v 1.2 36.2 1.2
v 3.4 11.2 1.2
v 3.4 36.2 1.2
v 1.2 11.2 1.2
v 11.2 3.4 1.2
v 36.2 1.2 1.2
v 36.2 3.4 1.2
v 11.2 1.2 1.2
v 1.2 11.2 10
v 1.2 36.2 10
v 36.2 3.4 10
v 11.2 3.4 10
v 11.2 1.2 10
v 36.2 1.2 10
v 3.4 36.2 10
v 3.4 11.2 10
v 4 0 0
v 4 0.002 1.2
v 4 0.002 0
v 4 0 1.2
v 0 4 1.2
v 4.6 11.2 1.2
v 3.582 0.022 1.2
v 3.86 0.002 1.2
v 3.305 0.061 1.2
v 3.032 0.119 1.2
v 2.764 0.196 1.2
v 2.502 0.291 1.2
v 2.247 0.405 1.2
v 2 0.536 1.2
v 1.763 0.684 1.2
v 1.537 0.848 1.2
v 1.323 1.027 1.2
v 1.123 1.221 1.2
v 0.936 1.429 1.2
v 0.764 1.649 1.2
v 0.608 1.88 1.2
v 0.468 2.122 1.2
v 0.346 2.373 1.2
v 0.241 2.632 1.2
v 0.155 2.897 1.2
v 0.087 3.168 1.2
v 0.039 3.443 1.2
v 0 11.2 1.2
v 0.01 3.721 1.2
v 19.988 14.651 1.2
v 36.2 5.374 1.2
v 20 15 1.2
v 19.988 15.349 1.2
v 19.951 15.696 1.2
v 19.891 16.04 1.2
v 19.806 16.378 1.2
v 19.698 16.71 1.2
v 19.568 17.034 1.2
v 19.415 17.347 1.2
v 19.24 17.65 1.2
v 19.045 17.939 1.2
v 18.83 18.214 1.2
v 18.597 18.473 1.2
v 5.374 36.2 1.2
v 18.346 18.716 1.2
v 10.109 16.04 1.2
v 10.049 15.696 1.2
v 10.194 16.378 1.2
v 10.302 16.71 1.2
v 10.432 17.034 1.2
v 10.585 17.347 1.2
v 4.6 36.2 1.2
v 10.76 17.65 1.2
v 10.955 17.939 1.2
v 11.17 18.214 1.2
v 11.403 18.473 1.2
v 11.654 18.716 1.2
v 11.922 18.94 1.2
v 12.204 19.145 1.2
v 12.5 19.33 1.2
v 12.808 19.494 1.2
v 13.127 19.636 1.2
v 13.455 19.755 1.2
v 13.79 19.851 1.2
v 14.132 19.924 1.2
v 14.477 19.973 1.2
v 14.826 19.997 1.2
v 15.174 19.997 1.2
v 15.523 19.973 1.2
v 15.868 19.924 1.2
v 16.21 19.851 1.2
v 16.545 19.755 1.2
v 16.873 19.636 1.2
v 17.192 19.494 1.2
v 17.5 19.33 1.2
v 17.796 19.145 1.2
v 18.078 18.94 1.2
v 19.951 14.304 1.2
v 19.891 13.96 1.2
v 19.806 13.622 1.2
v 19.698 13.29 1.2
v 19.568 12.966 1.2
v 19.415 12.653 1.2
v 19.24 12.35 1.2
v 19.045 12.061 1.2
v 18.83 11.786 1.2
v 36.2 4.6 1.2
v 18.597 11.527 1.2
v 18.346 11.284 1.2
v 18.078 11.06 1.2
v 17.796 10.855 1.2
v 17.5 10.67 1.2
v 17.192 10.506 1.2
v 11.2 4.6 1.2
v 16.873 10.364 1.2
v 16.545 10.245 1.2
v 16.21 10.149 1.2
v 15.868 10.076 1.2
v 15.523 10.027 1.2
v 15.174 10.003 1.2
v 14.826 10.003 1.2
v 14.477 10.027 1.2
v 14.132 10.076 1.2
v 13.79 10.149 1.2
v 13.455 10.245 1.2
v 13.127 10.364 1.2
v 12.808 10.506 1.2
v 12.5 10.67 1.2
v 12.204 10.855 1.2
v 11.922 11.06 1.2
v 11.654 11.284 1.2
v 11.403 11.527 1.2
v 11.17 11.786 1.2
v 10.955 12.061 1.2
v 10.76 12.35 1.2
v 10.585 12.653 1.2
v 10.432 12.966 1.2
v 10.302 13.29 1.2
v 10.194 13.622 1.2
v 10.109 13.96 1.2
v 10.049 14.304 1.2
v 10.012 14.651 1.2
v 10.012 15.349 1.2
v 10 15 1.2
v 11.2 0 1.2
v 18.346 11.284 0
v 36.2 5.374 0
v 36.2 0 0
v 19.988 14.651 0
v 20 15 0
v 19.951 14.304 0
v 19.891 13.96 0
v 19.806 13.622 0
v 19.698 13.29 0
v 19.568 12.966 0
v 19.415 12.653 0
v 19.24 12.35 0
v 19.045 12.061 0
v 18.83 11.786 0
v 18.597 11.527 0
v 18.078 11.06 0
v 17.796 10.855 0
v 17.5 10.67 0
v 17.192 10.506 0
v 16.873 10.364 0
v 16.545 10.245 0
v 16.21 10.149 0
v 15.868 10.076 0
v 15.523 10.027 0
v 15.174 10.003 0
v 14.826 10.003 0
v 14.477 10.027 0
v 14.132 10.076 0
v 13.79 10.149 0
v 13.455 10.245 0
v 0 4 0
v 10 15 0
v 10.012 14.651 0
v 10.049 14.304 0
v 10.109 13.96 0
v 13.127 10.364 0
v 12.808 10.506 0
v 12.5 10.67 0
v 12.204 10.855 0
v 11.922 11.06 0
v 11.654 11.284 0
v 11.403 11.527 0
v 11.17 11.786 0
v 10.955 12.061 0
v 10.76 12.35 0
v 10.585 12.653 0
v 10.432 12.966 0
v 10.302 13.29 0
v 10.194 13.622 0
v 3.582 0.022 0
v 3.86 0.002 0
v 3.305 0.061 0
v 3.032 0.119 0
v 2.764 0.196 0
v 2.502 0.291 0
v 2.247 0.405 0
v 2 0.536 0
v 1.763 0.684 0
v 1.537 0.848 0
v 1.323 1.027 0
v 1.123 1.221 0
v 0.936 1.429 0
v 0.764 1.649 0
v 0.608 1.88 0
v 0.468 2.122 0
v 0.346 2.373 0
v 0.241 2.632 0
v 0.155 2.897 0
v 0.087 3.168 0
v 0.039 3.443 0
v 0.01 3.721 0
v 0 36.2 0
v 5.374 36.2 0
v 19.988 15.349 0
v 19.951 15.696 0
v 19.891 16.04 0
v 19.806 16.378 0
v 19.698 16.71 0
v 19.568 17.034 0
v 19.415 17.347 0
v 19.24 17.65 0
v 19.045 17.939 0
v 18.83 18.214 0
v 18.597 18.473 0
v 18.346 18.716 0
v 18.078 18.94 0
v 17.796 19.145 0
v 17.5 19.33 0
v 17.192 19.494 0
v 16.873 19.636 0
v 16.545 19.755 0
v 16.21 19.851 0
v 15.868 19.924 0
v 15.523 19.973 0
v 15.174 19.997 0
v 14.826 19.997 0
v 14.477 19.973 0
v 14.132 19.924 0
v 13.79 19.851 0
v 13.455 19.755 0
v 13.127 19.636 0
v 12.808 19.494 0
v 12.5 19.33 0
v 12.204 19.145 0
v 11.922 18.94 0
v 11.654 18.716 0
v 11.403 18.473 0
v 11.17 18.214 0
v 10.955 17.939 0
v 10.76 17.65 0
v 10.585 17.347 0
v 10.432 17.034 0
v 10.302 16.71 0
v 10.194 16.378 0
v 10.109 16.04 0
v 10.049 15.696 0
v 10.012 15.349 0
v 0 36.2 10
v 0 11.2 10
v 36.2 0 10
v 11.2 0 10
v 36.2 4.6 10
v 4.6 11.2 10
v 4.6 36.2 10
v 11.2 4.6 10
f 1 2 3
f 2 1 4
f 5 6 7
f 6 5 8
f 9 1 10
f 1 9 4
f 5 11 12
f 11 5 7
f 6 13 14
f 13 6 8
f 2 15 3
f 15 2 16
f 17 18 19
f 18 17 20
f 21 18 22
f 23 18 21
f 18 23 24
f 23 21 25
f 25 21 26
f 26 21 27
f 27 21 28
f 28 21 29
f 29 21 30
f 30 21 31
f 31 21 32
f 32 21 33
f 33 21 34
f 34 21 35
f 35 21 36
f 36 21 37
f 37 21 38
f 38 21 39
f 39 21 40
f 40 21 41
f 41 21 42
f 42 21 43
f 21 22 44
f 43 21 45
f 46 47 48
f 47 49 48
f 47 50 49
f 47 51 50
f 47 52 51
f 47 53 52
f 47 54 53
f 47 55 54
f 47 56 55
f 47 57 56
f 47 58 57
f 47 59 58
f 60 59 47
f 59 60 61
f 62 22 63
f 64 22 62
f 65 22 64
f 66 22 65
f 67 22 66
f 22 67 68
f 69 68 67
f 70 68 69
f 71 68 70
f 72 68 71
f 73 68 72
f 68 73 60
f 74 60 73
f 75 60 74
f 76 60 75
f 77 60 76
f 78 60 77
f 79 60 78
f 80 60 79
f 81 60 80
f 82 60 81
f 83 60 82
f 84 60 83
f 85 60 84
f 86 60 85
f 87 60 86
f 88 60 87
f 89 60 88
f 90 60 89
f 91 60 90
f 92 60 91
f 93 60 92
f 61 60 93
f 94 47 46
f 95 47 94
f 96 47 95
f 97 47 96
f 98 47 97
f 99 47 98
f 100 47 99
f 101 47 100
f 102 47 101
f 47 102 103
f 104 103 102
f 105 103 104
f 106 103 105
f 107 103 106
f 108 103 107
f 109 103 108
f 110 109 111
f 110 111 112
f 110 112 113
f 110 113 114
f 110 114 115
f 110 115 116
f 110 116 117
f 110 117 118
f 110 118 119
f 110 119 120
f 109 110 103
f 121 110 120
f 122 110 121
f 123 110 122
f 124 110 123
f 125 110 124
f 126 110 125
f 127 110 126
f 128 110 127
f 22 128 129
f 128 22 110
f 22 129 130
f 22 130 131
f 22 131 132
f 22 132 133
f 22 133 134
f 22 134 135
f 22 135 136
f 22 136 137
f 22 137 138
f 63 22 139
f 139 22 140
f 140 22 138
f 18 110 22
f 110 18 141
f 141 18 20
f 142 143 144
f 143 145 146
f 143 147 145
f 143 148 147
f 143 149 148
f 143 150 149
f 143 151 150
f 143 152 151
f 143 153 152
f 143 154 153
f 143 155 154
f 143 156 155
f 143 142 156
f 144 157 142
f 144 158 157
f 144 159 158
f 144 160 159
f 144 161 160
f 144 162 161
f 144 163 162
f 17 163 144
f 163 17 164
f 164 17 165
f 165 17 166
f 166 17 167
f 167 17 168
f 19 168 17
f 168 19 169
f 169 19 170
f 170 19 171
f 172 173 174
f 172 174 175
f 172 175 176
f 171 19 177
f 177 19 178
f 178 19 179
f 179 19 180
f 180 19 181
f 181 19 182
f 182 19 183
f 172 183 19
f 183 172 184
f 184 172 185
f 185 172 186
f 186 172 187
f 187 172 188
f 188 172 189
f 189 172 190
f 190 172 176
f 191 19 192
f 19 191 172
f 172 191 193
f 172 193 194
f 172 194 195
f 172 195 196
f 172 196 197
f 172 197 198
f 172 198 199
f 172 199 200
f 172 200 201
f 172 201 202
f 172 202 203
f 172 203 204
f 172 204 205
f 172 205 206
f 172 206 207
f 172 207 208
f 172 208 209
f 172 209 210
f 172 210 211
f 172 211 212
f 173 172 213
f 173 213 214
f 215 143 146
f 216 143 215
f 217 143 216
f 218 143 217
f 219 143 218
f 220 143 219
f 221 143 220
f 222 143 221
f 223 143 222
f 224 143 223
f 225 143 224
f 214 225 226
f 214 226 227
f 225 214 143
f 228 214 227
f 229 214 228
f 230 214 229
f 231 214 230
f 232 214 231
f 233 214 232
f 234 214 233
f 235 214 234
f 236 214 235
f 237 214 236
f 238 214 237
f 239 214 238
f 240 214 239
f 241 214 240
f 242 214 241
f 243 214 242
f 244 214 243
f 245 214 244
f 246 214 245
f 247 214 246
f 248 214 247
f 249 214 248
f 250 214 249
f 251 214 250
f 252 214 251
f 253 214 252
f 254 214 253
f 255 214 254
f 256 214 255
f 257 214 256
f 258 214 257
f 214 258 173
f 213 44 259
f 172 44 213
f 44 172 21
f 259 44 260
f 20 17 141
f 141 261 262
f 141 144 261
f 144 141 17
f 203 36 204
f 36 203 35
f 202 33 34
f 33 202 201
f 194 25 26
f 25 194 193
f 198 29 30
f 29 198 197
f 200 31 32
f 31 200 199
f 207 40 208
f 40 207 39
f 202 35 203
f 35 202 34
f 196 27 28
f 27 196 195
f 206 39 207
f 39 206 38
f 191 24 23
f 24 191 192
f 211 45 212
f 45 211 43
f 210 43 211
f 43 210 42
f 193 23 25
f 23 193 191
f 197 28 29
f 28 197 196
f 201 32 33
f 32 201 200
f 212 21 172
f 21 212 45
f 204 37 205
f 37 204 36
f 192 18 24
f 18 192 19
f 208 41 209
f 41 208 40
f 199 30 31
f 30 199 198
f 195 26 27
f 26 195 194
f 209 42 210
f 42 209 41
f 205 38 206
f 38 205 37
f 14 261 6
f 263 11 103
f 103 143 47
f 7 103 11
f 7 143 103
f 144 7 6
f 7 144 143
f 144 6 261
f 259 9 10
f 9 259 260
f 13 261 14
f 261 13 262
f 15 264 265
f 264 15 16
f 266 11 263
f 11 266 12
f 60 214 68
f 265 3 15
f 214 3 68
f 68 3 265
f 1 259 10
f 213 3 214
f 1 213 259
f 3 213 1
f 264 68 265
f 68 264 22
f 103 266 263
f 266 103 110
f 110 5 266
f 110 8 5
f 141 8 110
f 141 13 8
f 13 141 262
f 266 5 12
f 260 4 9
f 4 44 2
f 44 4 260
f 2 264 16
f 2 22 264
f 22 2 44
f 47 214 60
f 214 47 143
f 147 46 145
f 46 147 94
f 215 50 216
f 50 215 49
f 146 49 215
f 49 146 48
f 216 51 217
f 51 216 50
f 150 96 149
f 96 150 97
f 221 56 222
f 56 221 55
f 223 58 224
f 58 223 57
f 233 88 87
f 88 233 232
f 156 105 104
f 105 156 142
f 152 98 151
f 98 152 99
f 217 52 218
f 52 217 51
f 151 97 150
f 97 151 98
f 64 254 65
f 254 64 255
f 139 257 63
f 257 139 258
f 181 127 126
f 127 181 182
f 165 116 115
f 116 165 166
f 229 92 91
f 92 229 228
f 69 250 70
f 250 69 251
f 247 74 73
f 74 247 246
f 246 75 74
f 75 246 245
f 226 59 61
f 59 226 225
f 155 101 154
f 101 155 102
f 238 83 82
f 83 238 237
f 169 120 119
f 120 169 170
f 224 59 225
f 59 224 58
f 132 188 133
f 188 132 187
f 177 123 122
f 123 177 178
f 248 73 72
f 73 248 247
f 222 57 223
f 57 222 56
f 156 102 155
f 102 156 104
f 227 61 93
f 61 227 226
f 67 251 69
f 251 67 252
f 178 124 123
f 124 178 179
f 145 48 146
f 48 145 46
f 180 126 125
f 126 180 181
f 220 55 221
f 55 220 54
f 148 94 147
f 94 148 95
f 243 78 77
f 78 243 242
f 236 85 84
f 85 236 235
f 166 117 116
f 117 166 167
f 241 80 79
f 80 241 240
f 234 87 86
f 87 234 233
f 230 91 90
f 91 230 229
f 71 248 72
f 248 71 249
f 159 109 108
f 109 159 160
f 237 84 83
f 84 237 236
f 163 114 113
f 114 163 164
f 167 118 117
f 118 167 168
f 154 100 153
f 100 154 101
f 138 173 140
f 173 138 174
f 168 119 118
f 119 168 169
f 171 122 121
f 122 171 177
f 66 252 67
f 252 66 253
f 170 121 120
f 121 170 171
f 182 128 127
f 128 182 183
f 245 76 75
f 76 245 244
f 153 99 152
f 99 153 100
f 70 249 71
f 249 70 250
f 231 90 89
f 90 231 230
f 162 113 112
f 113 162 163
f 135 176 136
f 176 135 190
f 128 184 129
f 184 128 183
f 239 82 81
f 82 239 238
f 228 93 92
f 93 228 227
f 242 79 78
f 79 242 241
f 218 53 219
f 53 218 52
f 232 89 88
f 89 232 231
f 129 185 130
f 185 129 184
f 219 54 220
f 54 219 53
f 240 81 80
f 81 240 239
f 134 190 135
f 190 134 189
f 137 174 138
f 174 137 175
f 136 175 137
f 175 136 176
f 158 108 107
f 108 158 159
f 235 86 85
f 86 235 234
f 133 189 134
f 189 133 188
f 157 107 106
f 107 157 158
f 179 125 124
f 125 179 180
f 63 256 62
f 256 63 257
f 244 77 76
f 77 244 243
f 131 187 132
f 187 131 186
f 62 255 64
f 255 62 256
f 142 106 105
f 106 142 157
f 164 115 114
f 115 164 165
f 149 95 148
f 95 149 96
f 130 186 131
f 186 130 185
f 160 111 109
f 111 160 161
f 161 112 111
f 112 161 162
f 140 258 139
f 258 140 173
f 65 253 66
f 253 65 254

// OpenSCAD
/*
 * Kovona Drumy Leg Cover
 *
 * Author: Pavel Rampas
 * Version: 1.0.0 (Changelog is at the bottom)
 * License: CC BY-SA 4.0 [https://creativecommons.org/licenses/by-sa/4.0/]
 * Link: https://github.com/pavelrampas/openscad-models
 *
 * OpenSCAD version: 2019.05
 *
 * Instructions:
 * Set up parameters, render and print.
 *
 * Height is layer.
 * Thickness is perimeter.
 */

// Parameters
//------------------------------------------------------------------------------

$fn = $preview ? 15 : 90;

thickness = 1.2; // print wall thickness
height = 1.2; // print bottom part height

depth = 10;

length = 35; // drumy side length
width = 2.2; // drumy side width

// Code
//------------------------------------------------------------------------------

// drumy test
translate([thickness, thickness, height]) {
    %cube([length, width, 50]);
    %cube([width,length, 50]);
}

difference() {
    cube([length + thickness, length + thickness, depth]);

    // drumy
    translate([thickness, thickness, height]) {
        cube([length, width, 50]);
        cube([width, length, 50]);
    }

    // inner cube
    translate([width + (2 * thickness), width + (2 * thickness), height]) {
        cube([length + thickness, length + thickness, depth]);
    }

    // cut outer corner
    translate([0, 0, height]) {
        cube([10 + thickness, 10 + thickness, 15]);
    }

    // cut inner corner
    translate([length + 7, length + 7, 0]) {
        rotate(a = [0, 0, 45]) {
            cube([60, 60, 60], center = true);
        }
    }

    // hole
    translate([15, 15, 0]) {
        cylinder(h = height, r = 5, center = false);
    }

    // round outer corner
    difference() {
        cube([4, 4, height]);
        translate([4, 4, 0]) {
            cylinder(h = height, r = 4, center = false);
        }
    }
}

// Functions
//------------------------------------------------------------------------------


// Modules
//------------------------------------------------------------------------------


// Changelog
//------------------------------------------------------------------------------

// [1.0.0]:
// Initial release.
